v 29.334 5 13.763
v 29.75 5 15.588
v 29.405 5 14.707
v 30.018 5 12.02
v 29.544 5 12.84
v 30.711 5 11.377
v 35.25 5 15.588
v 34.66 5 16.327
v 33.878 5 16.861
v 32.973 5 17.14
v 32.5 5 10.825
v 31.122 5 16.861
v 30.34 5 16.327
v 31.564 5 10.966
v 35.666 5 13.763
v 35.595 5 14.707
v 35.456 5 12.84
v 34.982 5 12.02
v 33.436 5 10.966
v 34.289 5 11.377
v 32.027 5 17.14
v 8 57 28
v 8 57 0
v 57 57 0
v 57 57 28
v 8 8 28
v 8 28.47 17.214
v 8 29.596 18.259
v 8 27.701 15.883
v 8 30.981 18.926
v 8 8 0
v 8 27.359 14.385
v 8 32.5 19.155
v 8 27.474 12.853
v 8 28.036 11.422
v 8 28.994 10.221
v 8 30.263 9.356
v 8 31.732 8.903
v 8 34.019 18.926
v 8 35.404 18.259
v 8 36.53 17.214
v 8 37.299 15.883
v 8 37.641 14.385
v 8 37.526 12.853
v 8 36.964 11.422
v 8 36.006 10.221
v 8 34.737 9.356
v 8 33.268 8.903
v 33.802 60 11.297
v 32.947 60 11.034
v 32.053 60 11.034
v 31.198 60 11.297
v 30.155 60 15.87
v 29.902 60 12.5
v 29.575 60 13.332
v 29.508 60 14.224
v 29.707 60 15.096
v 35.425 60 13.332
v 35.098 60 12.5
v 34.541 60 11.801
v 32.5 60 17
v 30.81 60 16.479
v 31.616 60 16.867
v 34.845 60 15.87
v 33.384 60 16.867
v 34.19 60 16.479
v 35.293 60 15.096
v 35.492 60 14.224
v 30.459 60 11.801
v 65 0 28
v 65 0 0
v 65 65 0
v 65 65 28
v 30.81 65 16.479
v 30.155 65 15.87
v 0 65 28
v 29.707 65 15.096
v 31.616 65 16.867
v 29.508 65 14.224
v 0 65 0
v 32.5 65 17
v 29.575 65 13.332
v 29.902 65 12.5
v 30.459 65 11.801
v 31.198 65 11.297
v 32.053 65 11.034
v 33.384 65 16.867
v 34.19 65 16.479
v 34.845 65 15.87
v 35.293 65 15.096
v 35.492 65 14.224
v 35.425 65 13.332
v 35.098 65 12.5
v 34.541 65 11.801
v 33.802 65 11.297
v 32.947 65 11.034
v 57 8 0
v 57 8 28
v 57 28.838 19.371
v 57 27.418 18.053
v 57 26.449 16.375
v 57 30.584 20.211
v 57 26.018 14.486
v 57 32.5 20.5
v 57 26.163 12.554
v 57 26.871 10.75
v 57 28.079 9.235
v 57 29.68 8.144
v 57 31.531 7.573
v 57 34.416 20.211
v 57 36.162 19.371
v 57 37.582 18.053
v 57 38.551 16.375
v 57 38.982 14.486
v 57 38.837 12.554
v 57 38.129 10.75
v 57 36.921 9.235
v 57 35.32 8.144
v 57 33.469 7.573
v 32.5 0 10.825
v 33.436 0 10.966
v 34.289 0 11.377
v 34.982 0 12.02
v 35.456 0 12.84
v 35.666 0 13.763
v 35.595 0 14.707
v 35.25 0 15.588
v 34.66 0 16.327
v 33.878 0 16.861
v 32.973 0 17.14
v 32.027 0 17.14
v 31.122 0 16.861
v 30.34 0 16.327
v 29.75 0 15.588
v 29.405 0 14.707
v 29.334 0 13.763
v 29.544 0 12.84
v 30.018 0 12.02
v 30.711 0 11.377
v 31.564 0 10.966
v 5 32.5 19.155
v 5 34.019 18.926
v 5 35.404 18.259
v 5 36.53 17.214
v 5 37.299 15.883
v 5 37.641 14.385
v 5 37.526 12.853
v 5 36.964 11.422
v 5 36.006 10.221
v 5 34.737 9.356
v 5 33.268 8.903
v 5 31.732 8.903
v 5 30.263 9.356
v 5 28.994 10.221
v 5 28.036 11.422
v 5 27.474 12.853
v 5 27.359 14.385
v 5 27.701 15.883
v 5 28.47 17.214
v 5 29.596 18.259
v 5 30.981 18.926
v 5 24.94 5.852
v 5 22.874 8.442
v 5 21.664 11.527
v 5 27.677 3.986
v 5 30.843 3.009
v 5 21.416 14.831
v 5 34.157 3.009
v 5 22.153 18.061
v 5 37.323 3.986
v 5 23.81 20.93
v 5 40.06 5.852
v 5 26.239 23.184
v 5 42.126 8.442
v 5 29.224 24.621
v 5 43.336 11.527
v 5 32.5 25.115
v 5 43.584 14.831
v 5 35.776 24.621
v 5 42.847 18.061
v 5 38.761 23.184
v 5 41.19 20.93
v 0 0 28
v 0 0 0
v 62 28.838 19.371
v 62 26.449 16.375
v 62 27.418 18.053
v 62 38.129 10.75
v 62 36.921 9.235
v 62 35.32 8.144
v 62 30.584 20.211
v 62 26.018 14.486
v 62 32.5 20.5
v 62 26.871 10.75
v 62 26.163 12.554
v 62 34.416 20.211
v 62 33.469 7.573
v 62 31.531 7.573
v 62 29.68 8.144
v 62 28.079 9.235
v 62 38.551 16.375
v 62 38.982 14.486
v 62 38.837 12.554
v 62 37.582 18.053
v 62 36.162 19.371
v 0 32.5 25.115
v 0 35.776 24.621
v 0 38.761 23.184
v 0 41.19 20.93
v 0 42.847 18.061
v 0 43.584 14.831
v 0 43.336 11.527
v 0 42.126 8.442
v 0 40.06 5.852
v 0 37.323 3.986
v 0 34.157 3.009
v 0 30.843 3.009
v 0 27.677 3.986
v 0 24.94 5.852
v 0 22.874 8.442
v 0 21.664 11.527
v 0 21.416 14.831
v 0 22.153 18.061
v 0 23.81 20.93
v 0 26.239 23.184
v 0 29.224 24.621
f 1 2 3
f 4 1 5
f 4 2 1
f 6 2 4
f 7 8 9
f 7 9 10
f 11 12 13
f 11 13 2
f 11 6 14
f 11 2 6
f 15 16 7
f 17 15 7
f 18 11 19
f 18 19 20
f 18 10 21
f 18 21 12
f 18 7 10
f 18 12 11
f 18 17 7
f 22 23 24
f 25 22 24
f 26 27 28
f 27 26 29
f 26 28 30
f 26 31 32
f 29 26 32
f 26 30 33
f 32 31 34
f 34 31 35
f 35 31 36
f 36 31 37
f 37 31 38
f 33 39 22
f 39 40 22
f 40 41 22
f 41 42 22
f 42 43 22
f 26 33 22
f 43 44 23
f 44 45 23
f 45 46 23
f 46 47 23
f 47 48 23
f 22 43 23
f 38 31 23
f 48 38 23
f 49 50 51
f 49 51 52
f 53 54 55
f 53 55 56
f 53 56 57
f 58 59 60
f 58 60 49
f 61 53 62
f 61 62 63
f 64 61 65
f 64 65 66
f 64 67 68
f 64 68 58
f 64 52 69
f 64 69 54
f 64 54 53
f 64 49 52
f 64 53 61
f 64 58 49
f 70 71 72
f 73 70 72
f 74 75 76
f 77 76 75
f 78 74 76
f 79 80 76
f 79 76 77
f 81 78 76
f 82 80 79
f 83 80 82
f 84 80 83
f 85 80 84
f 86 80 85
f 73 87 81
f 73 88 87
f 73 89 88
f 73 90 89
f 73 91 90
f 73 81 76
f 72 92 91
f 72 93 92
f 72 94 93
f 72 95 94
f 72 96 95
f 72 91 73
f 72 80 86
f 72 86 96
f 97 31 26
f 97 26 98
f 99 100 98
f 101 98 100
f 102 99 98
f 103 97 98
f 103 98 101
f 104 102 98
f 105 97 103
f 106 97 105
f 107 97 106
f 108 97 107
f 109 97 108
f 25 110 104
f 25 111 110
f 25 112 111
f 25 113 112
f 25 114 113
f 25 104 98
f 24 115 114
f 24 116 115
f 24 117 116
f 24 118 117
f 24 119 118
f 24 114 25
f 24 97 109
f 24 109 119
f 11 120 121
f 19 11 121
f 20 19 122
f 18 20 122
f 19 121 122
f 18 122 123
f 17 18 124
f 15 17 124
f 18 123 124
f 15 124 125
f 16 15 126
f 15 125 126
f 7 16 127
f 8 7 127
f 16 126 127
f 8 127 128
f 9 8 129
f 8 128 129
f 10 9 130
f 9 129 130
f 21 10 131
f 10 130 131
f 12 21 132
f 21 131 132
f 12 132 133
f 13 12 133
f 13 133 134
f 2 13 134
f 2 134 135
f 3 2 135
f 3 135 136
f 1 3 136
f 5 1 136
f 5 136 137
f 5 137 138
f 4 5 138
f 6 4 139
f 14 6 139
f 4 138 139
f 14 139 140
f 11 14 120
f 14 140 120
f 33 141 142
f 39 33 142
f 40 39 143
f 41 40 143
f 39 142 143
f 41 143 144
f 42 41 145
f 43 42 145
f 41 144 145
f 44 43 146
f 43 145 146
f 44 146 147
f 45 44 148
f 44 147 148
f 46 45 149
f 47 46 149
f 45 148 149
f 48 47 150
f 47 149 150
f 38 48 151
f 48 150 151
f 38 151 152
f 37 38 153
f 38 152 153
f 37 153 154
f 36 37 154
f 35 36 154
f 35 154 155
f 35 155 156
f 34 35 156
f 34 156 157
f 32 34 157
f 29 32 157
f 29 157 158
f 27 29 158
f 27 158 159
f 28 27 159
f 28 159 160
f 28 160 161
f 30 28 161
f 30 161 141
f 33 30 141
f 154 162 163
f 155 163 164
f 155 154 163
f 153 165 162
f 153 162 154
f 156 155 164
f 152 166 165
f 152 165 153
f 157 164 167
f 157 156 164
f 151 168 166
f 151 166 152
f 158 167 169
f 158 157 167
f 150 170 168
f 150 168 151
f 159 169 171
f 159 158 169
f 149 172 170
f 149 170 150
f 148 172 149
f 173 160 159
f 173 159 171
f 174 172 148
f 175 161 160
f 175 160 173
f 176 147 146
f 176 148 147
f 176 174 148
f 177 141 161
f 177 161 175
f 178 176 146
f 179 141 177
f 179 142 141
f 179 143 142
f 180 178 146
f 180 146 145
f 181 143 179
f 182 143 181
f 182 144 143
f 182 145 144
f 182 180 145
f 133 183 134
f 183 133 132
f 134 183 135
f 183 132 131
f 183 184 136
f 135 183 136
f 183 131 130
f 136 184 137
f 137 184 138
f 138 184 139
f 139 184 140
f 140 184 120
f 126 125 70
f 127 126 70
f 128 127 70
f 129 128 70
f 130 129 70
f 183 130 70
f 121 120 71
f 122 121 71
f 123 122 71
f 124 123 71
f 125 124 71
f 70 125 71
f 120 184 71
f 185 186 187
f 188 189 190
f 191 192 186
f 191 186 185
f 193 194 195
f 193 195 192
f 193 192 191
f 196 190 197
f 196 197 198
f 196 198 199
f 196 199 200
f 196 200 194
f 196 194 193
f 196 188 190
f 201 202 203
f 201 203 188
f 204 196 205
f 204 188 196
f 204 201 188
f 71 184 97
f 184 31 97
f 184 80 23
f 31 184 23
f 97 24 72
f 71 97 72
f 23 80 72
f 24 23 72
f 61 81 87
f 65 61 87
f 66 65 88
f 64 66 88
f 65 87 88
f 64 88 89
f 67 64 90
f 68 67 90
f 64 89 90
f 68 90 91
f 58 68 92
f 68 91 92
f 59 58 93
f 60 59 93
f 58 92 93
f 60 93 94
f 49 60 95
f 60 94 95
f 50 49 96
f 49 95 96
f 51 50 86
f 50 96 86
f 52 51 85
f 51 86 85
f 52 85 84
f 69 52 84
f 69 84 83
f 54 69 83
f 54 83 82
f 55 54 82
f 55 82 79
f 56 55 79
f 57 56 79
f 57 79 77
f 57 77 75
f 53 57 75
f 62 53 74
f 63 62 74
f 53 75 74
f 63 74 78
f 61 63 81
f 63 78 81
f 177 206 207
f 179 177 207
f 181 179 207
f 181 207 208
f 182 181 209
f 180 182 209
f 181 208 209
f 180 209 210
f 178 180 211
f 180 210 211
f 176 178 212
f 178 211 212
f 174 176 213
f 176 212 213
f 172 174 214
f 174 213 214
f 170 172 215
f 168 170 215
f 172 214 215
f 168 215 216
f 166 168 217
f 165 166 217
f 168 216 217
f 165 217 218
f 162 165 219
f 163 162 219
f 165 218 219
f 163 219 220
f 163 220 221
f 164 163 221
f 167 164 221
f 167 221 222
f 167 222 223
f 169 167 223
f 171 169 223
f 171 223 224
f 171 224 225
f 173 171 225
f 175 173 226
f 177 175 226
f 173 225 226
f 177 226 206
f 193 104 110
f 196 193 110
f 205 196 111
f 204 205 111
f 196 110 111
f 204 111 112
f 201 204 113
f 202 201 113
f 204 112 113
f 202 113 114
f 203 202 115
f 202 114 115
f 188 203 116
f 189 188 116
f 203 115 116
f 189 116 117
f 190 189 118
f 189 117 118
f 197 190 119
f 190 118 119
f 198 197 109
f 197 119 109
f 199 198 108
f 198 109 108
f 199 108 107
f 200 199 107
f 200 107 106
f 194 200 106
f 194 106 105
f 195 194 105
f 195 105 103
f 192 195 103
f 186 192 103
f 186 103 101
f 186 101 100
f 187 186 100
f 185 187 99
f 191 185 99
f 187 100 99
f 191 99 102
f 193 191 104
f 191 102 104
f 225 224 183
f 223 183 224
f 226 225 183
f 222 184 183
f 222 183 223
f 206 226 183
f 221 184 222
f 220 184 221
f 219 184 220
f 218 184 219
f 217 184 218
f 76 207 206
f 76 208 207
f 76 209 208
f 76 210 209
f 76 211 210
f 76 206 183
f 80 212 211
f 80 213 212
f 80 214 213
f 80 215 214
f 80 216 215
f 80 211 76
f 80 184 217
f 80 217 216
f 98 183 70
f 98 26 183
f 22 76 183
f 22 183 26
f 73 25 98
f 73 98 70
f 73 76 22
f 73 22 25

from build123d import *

# Parameters (mm, degrees)
CROQUIS1_W              = 65
CROQUIS1_H              = 65
CROQUIS1_W_2            = 49
CROQUIS1_H_2            = 49
SALIENTE_EXTRUIR1_DEPTH = 28
CROQUIS2_R              = 11.115
CORTAR_EXTRUIR1_DEPTH   = 5
CROQUIS3_R              = 5.155
CORTAR_EXTRUIR2_DEPTH   = 8
CROQUIS5_R              = 6.5
CORTAR_EXTRUIR3_DEPTH   = 5
CROQUIS6_R              = 3
CORTAR_EXTRUIR4_DEPTH   = 5
CROQUIS7_R              = 3.175
CORTAR_EXTRUIR5_DEPTH   = 5


with BuildPart() as part:
    # Croquis1 → Saliente-Extruir1 (new body)
    with BuildSketch(Plane.XY):
        with Locations((32.5, 32.5)):
            Rectangle(CROQUIS1_W, CROQUIS1_H)
        with Locations((32.5, 32.5)):
            Rectangle(CROQUIS1_W_2, CROQUIS1_H_2, mode=Mode.SUBTRACT)
    extrude(amount=SALIENTE_EXTRUIR1_DEPTH)

    # Croquis2 → Cortar-Extruir1 (cut)
    with BuildSketch(Plane.ZY):
        with Locations((14, 32.5)):
            Circle(CROQUIS2_R)
    extrude(amount=-CORTAR_EXTRUIR1_DEPTH, mode=Mode.SUBTRACT)

    # Croquis3 → Cortar-Extruir2 (cut)
    with BuildSketch(Plane.ZY):
        with Locations((14, 32.5)):
            Circle(CROQUIS3_R)
    extrude(amount=-CORTAR_EXTRUIR2_DEPTH, mode=Mode.SUBTRACT)

    # Croquis5 → Cortar-Extruir3 (cut)
    with BuildSketch(Plane.ZY.offset(-57)):
        with Locations((14, 32.5)):
            Circle(CROQUIS5_R)
    extrude(amount=-CORTAR_EXTRUIR3_DEPTH, mode=Mode.SUBTRACT)

    # Croquis6 → Cortar-Extruir4 (cut)
    with BuildSketch(Plane(origin=(0, 65, 0), x_dir=(1, 0, 0), z_dir=(0, 1, 0))):
        with Locations(Location((32.5, -14, 0), (0, 0, 270))):
            Circle(CROQUIS6_R)
    extrude(amount=-CORTAR_EXTRUIR4_DEPTH, mode=Mode.SUBTRACT)

    # Croquis7 → Cortar-Extruir5 (cut)
    with BuildSketch(Plane.XZ):
        with Locations(Location((32.5, 14, 0), (0, 0, 270))):
            Circle(CROQUIS7_R)
    extrude(amount=-CORTAR_EXTRUIR5_DEPTH, mode=Mode.SUBTRACT)


solid = part.part
